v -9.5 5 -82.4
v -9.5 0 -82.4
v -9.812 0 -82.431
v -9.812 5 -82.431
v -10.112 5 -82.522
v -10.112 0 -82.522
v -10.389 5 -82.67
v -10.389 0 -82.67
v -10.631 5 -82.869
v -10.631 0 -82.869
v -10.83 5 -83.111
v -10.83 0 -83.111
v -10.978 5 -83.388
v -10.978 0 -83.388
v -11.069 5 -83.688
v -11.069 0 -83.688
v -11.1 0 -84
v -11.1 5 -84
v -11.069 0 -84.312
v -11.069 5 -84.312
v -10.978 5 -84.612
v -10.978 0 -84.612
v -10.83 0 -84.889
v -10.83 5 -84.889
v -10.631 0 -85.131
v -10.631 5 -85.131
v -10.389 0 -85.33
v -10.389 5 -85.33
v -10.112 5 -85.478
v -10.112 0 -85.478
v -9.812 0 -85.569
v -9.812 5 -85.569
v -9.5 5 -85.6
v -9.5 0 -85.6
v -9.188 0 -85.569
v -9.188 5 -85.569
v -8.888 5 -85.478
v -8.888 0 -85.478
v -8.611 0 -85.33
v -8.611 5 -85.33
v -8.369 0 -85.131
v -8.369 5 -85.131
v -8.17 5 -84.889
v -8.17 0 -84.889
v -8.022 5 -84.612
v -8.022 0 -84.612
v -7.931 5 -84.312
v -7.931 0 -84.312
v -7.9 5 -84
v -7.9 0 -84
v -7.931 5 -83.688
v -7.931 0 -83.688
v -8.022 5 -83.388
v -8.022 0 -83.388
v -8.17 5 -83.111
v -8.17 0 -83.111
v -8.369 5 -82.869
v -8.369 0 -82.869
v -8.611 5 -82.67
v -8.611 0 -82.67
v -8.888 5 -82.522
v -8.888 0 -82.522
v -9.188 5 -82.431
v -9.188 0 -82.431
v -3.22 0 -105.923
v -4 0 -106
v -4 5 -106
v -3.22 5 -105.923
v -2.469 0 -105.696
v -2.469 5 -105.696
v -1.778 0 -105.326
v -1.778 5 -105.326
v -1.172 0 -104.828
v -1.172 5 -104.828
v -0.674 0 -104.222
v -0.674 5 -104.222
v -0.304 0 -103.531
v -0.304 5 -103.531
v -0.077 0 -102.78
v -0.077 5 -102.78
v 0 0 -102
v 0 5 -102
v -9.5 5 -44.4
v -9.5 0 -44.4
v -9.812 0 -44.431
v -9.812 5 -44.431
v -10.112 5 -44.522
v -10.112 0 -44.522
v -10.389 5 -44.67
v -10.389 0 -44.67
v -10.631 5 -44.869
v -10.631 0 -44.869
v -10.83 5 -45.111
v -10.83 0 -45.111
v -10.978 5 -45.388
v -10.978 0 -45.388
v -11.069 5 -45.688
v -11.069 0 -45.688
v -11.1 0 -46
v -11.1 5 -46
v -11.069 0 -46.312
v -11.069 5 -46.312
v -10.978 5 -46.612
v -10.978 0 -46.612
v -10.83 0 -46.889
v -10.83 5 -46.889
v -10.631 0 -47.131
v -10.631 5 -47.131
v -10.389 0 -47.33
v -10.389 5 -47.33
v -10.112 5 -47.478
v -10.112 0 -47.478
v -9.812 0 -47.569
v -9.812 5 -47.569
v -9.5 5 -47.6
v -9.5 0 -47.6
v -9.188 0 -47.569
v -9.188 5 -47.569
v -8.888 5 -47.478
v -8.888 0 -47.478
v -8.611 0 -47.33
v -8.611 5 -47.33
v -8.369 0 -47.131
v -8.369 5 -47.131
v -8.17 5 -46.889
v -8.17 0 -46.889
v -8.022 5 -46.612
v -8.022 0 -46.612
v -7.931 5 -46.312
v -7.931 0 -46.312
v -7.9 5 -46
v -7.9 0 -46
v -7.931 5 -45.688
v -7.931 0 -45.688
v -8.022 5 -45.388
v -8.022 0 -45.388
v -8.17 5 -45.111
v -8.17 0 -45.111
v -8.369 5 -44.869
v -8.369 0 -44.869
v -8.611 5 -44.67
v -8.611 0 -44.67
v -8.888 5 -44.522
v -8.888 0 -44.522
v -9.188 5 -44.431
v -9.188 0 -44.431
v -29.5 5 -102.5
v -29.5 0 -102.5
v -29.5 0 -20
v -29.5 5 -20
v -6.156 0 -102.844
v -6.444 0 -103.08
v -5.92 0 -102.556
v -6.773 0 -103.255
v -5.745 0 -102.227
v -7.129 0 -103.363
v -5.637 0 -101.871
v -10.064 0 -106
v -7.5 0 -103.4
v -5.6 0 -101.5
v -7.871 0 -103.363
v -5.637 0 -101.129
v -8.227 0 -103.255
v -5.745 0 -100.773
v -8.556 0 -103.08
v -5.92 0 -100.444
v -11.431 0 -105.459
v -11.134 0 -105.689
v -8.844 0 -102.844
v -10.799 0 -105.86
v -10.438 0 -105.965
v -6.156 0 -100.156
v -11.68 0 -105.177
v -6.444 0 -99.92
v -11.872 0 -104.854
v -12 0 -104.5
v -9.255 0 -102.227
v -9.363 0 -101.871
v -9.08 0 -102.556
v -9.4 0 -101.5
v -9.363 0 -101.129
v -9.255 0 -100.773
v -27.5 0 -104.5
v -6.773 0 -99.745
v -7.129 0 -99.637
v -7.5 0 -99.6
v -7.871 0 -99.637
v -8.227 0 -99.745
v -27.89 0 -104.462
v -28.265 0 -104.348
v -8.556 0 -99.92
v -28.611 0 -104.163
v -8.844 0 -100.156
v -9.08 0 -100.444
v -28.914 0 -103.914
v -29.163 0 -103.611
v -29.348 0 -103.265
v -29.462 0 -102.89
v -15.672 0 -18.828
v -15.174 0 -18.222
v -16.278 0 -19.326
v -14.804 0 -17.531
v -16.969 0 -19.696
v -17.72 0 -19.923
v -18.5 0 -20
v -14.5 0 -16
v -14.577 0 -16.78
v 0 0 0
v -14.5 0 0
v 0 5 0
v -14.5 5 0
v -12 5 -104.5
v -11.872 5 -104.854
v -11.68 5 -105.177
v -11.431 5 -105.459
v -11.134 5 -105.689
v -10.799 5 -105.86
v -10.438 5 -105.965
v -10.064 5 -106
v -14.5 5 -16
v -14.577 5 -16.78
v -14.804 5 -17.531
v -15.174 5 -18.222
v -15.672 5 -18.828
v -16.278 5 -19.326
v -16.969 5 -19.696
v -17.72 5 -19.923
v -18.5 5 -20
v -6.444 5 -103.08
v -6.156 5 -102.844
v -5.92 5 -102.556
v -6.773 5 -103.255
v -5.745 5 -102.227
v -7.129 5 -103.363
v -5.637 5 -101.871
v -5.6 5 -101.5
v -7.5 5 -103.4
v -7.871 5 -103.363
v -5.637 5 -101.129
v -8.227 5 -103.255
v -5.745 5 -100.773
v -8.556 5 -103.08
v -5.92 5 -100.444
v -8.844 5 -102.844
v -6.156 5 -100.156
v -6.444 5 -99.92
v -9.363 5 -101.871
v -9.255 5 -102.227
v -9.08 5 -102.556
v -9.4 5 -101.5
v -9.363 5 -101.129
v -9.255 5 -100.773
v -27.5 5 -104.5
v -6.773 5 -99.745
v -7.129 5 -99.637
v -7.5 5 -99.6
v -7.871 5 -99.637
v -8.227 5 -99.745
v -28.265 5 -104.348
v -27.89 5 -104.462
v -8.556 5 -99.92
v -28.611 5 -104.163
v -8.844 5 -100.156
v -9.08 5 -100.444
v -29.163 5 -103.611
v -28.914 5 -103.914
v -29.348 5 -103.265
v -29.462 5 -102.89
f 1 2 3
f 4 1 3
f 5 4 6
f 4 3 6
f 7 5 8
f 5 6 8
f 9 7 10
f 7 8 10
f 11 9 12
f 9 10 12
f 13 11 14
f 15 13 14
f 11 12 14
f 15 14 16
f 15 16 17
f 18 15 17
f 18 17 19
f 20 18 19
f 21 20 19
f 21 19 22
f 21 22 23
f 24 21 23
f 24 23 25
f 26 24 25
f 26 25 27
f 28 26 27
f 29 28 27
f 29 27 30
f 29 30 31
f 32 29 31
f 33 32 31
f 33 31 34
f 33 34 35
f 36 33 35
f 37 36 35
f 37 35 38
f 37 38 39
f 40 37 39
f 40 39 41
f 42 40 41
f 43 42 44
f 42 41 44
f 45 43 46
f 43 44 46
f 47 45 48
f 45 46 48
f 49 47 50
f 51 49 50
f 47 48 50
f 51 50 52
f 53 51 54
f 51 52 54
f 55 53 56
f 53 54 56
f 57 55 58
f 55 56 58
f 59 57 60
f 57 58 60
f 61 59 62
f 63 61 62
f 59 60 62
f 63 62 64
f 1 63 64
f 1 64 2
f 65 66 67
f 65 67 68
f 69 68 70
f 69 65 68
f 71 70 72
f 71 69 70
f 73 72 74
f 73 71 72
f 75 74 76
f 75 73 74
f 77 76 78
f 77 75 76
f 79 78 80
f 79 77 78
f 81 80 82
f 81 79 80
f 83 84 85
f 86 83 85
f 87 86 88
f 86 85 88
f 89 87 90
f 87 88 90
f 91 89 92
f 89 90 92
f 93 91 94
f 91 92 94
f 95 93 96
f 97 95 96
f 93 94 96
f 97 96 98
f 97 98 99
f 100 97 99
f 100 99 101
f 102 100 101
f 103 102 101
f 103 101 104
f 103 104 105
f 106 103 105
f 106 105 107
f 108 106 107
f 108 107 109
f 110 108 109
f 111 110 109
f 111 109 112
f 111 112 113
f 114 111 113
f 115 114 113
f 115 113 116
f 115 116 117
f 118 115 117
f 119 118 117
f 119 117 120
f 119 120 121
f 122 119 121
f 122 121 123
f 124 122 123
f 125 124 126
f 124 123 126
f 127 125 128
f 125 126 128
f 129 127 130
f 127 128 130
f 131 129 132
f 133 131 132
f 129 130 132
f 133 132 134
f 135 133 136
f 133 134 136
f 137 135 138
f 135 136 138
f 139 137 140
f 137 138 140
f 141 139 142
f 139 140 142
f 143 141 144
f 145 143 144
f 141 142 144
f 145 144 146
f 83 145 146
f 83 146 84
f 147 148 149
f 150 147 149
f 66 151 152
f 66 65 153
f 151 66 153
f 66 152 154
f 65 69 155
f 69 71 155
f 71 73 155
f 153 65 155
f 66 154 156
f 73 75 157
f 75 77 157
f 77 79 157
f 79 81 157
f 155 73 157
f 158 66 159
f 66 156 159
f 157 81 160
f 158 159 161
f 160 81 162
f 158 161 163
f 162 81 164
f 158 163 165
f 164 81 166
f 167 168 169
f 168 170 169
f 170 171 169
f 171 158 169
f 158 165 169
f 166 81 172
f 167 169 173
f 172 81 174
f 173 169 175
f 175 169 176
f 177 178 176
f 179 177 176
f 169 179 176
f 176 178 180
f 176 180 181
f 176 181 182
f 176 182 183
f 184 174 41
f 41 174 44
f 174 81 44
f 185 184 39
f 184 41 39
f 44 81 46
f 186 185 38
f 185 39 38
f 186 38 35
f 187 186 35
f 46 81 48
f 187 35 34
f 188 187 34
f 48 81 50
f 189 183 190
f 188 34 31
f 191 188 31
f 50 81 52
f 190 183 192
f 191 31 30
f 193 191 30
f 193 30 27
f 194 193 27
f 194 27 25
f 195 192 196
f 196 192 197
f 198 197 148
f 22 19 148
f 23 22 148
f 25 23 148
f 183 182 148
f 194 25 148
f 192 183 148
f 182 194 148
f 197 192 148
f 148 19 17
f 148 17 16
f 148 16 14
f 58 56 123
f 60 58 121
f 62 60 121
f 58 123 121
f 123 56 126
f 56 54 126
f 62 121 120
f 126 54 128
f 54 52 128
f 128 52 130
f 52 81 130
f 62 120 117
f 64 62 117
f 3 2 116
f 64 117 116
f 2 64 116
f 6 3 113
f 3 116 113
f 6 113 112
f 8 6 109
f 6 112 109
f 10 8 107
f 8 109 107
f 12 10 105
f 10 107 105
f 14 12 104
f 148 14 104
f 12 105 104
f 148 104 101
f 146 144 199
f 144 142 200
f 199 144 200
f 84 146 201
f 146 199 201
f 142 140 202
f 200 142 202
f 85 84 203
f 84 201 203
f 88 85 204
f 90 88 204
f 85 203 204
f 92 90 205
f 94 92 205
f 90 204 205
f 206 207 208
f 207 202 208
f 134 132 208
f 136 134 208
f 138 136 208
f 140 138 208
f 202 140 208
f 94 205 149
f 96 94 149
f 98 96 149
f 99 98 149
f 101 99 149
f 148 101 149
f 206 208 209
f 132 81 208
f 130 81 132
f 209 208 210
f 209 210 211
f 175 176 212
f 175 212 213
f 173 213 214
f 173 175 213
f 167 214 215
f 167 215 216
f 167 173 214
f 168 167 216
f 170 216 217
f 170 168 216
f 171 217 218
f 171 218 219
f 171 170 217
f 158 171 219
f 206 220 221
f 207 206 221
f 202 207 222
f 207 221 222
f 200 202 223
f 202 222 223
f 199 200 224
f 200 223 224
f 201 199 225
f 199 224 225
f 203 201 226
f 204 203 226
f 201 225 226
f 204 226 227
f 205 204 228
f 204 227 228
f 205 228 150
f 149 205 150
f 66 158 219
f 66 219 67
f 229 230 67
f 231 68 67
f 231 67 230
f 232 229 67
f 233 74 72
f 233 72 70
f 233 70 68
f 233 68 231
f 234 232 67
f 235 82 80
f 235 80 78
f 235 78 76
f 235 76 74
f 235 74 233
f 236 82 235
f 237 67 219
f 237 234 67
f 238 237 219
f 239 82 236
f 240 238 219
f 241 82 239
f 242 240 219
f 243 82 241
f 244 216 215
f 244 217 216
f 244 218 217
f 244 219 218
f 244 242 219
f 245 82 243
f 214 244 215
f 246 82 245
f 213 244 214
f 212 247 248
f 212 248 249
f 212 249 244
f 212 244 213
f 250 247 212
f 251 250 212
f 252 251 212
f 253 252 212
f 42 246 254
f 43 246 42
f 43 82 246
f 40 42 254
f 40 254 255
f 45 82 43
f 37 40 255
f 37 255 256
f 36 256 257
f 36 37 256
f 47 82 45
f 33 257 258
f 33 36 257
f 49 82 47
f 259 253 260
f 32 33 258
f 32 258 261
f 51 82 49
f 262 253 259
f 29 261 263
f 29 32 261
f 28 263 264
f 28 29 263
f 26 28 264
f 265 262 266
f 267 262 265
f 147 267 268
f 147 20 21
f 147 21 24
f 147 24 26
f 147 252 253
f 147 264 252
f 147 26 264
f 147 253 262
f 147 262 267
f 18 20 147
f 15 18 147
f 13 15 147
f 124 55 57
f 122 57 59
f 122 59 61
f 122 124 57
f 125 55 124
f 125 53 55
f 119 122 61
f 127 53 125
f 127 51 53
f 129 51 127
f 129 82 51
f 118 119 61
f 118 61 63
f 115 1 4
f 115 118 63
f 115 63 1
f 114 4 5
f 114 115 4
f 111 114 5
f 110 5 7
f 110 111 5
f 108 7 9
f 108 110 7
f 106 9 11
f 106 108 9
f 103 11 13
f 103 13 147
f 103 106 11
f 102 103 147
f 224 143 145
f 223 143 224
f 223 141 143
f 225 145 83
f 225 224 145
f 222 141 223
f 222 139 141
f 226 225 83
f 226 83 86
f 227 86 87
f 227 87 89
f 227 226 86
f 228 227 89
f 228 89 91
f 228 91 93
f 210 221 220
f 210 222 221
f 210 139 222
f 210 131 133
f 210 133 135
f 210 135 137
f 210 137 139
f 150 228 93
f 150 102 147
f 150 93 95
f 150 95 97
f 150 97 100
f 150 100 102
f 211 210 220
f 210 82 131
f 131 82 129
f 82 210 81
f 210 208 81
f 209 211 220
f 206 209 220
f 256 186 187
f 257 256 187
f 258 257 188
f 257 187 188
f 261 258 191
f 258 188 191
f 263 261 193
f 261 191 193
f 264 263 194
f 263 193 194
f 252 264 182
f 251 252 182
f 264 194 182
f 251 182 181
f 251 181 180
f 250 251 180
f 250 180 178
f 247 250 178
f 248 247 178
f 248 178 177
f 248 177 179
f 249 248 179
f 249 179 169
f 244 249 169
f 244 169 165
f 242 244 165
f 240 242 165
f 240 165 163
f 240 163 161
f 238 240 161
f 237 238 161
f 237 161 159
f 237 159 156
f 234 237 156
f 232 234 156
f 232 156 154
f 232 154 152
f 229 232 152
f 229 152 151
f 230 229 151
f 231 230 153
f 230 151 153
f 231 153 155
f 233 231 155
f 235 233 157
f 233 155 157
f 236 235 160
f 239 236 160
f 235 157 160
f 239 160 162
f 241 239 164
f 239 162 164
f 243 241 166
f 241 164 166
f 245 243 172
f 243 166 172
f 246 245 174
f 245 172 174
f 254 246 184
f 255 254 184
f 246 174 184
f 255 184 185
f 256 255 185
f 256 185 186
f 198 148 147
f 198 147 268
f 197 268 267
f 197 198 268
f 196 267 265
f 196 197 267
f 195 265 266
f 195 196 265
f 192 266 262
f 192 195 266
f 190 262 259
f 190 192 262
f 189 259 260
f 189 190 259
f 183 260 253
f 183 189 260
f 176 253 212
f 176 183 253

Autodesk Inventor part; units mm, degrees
ref_plane "YZ Plane" through (0, 0, 0) normal (1, 0, 0) x (0, 1, 0)
ref_plane "XZ Plane" through (0, 0, 0) normal (0, 1, 0) x (-1, 0, 0)
ref_plane "XY Plane" through (0, 0, 0) normal (0, 0, 1) x (1, 0, 0)
sketch "Sketch1" plane through (0, 0, 0) normal (0, 1, 0) x (-1, 0, 0)
  line L0 (0, 0) -> (29.5, 0)
  line L1 (29.5, -15) -> (29.5, -102.5)
  line L2 (0.8775, -104.5) -> (0, -104.5)
  line L3 (0, -102.5) -> (0, -15)
  line L4 (0, -93.5) -> (0, -102)
  line L5 (0, -43.5) -> (0, -56.5)
  line L6 (29.5, 0) -> (0, 0)
  line L7 (0, 0) -> (0, -15)
  line L8 (29.5, -15) -> (29.5, 0)
  arc A0 (27.5, -104.5) -> (29.5, -102.5) centre (27.5, -102.5) ccw
  line L9 (27.5, -104.5) -> (12, -104.5)
  line L10 (27.5, -104.5) -> (12, -104.5)
  line L11 (0, -104.5) -> (0.8775, -104.5)
  line L12 (12, -104.5) -> (12, -106)
  line L13 (12, -106) -> (4, -106)
  line L14 (0, -102) -> (0, -104.5)
  arc A1 (0, -102) -> (4, -106) centre (4, -102) ccw
  point P0 (29.5, -104.5)
  point P1 (11, -104.5)
  point P2 (0, -102)
  point P3 (0, -106)
  dimension "d0" = 29.5
  dimension "d1" = 104.5
  dimension "d7" = 15
  dimension "d8" = 2
  dimension "d40" = 12
  dimension "d41" = 1.5
  dimension "d42" = 4
extrude "Extrusion1" add sketch "Sketch1" along normal blind 5 contours L0 L8 L1 A0 L9 L12 L13 A1 L3 L7
sketch "Sketch2" plane through (0, 5, 0) normal (0, 1, 0) x (1, 0, 0)
  line L0 (-9.5, -6.918) -> (-9.5, 116.4057) construction
  line L1 (0, 0) -> (0, 102) construction
  line L2 (-29.5, 102.5) -> (-29.5, 0) projected
  point P0 (-9.5, 84)
  point P1 (-9.5, 46)
  point P2 (-29.5, 16)
  point P3 (0, 16)
  point P4 (0, 102.5)
  point P5 (0, 104.5)
  dimension "d13" = 46
  dimension "d14" = 84
  dimension "d23" = 20
hole "Hole1" at (-9.5, 5, -84) at (-9.5, 5, -46) direction (0, -1, 0) diameter 3.2 end through all
sketch "Sketch3" plane through (0, 5, 0) normal (0, 1, 0) x (1, 0, 0)
  line L0 (-29.5, 0) -> (0, 0) projected
  line L1 (-29.5, 0) -> (-14.5, 0)
  line L2 (-14.5, 0) -> (-14.5, 16)
  line L3 (-18.5, 20) -> (-29.5, 20)
  line L4 (-29.5, 20) -> (-29.5, 0)
  arc A0 (-14.5, 16) -> (-18.5, 20) centre (-18.5, 16) ccw
  point P0 (-14.5, 20)
  dimension "d26" = 15
  dimension "d27" = 20
  dimension "d28" = 4
extrude "Extrusion2" cut sketch "Sketch3" against normal through all
sketch "Sketch4" plane through (0, 5, 0) normal (0, 1, 0) x (1, 0, 0)
  line L0 (0, 0) -> (0, 102) projected
  line L1 (-4, 106) -> (-12, 106) projected
  point P0 (-7.5, 101.5)
  dimension "d31" = 7.5
  dimension "d43" = 4.5
hole "Hole2" at (-7.5, 5, -101.5) direction (0, -1, 0) diameter 3.8 end through all
fillet "Fillet1" radius 2 1 edges at (-12, 2.5, -106)
properties part number "Upper slide"
